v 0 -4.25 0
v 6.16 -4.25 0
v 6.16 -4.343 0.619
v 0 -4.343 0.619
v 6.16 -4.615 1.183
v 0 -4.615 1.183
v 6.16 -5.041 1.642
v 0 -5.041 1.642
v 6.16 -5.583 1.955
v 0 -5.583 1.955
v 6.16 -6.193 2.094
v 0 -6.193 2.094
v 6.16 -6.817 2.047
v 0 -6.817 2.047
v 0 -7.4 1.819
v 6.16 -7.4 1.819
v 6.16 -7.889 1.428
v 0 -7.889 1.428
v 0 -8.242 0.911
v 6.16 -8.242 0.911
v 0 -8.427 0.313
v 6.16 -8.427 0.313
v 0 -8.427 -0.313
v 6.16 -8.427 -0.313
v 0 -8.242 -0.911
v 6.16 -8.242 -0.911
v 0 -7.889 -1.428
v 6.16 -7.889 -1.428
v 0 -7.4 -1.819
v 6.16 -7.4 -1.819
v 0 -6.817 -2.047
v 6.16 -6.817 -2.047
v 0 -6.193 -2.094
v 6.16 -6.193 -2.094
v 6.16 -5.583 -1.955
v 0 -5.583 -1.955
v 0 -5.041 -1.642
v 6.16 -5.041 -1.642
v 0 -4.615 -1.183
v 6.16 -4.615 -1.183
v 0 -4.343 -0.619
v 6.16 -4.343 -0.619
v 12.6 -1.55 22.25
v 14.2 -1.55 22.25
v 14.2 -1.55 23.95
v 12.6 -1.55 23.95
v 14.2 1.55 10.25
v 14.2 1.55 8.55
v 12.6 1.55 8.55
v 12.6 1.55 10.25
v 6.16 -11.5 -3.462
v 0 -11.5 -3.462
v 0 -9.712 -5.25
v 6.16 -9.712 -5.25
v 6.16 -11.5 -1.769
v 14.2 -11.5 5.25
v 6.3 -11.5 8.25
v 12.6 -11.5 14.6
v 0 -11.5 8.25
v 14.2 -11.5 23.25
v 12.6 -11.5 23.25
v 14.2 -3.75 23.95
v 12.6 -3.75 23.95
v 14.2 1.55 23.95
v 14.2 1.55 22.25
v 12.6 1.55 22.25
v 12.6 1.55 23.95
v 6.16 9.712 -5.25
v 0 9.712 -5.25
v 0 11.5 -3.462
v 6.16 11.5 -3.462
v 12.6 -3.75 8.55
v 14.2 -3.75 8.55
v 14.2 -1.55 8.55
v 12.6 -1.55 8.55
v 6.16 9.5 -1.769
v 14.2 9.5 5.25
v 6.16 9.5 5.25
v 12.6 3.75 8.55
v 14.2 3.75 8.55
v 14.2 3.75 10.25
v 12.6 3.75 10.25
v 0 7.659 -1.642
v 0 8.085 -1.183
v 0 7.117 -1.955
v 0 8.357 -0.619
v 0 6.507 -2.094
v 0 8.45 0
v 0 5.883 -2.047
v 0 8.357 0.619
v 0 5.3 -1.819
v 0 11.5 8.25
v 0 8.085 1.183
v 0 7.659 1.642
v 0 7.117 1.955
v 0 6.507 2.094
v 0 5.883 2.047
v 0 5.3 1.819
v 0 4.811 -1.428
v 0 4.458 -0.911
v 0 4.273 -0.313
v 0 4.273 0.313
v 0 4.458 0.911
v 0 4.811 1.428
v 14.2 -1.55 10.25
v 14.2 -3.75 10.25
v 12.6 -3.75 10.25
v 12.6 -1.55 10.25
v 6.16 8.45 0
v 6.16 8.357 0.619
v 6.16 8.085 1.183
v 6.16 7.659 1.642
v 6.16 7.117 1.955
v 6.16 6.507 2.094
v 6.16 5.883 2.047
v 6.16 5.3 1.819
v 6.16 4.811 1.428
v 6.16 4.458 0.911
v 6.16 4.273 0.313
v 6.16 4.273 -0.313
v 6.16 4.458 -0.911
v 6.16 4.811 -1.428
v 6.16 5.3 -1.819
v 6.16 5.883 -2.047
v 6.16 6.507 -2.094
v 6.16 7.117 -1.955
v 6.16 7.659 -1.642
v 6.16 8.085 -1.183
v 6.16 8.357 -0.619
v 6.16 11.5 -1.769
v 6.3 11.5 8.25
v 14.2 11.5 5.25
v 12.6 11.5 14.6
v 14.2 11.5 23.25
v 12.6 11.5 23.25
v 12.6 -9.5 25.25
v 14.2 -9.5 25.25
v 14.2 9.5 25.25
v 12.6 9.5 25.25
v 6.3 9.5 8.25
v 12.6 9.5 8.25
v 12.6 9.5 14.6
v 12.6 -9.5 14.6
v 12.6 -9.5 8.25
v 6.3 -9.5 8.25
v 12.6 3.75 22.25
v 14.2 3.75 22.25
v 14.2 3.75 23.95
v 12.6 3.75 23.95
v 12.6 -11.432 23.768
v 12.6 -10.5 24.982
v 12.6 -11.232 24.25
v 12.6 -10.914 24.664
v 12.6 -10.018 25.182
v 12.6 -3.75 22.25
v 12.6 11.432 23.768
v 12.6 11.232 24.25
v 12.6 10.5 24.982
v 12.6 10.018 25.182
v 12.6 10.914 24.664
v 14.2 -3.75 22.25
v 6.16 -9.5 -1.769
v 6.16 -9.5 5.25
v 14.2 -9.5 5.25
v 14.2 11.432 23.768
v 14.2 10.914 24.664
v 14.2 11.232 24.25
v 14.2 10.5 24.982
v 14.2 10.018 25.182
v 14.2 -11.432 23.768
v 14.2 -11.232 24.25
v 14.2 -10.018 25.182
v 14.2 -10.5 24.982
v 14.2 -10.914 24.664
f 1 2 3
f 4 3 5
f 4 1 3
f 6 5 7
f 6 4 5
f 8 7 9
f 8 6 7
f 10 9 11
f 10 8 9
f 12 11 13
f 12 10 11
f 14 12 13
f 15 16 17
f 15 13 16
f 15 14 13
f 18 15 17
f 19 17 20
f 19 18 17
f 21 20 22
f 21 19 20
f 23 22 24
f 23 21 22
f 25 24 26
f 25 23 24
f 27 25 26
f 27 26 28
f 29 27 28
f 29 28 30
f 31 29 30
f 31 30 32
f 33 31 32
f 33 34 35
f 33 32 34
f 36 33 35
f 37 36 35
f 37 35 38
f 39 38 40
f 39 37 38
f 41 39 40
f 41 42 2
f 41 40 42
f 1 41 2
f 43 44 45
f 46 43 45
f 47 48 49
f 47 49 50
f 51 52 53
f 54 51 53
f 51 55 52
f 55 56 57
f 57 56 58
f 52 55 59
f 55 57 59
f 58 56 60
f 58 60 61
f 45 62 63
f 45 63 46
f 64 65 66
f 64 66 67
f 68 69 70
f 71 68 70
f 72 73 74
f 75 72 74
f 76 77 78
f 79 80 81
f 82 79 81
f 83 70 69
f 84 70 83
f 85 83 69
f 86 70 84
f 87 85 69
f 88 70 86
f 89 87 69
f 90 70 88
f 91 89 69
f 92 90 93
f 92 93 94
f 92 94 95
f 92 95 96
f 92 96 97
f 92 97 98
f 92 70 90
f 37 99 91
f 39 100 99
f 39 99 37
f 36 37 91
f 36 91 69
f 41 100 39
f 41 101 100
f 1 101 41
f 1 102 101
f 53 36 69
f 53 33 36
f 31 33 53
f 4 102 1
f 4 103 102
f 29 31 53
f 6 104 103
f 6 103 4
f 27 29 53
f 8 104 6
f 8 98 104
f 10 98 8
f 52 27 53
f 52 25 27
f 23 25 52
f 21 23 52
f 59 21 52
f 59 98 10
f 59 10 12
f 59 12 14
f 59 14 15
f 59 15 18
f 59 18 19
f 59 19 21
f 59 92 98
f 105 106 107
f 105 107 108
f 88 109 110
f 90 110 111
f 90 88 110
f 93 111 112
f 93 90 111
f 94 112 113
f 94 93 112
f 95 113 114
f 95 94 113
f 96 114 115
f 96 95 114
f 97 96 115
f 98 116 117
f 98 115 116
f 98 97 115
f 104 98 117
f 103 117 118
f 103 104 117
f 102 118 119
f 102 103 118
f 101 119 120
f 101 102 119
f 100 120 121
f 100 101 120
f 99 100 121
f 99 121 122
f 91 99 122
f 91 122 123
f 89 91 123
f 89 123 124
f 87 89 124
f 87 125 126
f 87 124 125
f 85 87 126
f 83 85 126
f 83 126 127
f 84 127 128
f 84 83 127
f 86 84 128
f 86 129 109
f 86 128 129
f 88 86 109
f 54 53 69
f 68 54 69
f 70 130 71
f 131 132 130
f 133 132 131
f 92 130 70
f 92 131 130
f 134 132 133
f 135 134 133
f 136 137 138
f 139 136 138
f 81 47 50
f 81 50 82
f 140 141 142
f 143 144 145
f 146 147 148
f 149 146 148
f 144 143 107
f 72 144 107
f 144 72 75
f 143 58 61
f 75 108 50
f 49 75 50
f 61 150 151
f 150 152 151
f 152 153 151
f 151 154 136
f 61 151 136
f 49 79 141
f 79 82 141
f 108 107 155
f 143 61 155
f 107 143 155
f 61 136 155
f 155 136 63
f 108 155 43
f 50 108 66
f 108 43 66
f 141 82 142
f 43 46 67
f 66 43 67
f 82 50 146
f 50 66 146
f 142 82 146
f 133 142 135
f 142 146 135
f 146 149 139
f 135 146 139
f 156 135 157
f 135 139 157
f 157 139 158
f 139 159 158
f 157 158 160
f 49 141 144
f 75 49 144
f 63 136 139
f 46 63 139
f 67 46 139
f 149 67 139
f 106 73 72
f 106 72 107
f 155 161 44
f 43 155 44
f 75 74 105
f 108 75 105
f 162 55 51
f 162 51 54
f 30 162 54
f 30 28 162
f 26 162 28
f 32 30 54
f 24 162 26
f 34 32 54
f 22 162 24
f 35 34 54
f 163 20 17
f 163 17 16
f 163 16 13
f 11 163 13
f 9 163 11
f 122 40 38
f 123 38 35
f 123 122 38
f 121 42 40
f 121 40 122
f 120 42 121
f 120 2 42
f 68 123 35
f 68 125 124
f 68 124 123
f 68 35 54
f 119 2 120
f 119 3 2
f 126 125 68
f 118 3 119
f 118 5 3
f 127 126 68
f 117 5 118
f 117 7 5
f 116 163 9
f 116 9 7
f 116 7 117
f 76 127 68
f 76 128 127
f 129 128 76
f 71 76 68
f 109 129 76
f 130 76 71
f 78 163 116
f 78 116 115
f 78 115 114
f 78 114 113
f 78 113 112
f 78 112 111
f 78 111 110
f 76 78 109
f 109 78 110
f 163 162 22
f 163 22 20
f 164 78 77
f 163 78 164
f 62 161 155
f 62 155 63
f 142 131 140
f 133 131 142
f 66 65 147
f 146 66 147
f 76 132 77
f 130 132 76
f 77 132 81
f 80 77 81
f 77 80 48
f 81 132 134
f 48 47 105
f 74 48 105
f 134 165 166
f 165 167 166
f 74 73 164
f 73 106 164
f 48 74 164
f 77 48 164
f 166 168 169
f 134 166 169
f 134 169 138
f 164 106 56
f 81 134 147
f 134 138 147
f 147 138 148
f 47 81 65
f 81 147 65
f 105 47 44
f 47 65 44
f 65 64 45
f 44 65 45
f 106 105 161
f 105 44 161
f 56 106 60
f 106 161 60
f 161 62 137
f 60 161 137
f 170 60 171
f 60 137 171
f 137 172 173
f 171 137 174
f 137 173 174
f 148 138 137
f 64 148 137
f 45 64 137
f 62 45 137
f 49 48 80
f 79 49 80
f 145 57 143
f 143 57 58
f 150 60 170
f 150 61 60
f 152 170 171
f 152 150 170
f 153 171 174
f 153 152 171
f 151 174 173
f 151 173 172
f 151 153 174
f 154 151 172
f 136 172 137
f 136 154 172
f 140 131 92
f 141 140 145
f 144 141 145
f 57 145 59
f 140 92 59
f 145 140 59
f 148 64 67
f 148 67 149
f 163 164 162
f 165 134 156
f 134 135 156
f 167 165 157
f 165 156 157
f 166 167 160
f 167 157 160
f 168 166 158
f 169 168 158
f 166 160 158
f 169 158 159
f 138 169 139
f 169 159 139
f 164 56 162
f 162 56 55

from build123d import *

# Parameters (mm, degrees)
F0_R     = 2.1
F1_DEPTH = 6.16
F2_W     = 23
F2_H     = 3
F3_DEPTH = 14.2
F4_W     = 23
F4_H     = 20
F4_W_2   = 2.2
F4_H_2   = 1.7
F5_DEPTH = 1.6
F8_DEPTH = 2
F12_R    = 2


with BuildPart() as f1:
    # F0 (on Right) → F1 (new body)
    with BuildSketch(Plane.YZ):
        Polygon((-9.7124977037, -5.25), (9.7124977037, -5.25), (11.5, -3.4624977037), (11.5, 3.4624977037), (11.5, 5.25), (9.7124977037, 5.25), (-9.7124977037, 5.25), (-11.5, 5.25), (-11.5, 3.4624977037), (-11.5, -3.4624977037), align=None)
        with Locations((-6.35, 0)):
            Circle(F0_R, mode=Mode.SUBTRACT)
        with Locations((6.35, 0)):
            Circle(F0_R, mode=Mode.SUBTRACT)
    extrude(amount=F1_DEPTH)

    # F2 (on face) → F3 (join)
    with BuildSketch(Plane(origin=(0, 0, 0), x_dir=(0, -1, 0), z_dir=(-1, 0, 0))):
        with Locations((0, 6.75)):
            Rectangle(F2_W, F2_H)
    extrude(amount=-F3_DEPTH)

    # F4 (on face) → F5 (join)
    with BuildSketch(Plane.YZ.offset(14.2)):
        with Locations((0, 15.25)):
            Rectangle(F4_W, F4_H)
        with Locations((-2.65, 9.4)):
            Rectangle(F4_W_2, F4_H_2, mode=Mode.SUBTRACT)
        with Locations((2.65, 9.4)):
            Rectangle(F4_W_2, F4_H_2, mode=Mode.SUBTRACT)
        with Locations((-2.65, 23.1)):
            Rectangle(F4_W_2, F4_H_2, mode=Mode.SUBTRACT)
        with Locations((2.65, 23.1)):
            Rectangle(F4_W_2, F4_H_2, mode=Mode.SUBTRACT)
    extrude(amount=-F5_DEPTH)

    # F6: union 

    # F7 (on face) → F8 (join)
    with BuildSketch(Plane(origin=(0, 11.5, 0), x_dir=(-1, 0, 0), z_dir=(0, 1, 0))):
        Polygon((-6.3, 8.25), (-12.6, 14.6002341062), (-12.6, 8.25), align=None)
        Polygon((-6.16, 5.25), (-14.2, 5.25), (-6.16, -1.7691504909), align=None)
    extrude(amount=-F8_DEPTH)

    # F10: F1 across plane


with BuildPart() as f1_1:
    add(f1.part)
    add(f1.part.mirror(Plane.XZ))

    # F11: F1 across plane


with BuildPart() as f1_2:
    add(f1_1.part)
    add(f1_1.part.mirror(Plane.XZ))

    # F12
    f12_edges = [f1_2.edges().sort_by_distance(p)[0] for p in [
        (13.4, 11.5, 25.25),
        (13.4, -11.5, 25.25),
    ]]
    fillet(f12_edges, radius=F12_R)


solid = f1_2.part
